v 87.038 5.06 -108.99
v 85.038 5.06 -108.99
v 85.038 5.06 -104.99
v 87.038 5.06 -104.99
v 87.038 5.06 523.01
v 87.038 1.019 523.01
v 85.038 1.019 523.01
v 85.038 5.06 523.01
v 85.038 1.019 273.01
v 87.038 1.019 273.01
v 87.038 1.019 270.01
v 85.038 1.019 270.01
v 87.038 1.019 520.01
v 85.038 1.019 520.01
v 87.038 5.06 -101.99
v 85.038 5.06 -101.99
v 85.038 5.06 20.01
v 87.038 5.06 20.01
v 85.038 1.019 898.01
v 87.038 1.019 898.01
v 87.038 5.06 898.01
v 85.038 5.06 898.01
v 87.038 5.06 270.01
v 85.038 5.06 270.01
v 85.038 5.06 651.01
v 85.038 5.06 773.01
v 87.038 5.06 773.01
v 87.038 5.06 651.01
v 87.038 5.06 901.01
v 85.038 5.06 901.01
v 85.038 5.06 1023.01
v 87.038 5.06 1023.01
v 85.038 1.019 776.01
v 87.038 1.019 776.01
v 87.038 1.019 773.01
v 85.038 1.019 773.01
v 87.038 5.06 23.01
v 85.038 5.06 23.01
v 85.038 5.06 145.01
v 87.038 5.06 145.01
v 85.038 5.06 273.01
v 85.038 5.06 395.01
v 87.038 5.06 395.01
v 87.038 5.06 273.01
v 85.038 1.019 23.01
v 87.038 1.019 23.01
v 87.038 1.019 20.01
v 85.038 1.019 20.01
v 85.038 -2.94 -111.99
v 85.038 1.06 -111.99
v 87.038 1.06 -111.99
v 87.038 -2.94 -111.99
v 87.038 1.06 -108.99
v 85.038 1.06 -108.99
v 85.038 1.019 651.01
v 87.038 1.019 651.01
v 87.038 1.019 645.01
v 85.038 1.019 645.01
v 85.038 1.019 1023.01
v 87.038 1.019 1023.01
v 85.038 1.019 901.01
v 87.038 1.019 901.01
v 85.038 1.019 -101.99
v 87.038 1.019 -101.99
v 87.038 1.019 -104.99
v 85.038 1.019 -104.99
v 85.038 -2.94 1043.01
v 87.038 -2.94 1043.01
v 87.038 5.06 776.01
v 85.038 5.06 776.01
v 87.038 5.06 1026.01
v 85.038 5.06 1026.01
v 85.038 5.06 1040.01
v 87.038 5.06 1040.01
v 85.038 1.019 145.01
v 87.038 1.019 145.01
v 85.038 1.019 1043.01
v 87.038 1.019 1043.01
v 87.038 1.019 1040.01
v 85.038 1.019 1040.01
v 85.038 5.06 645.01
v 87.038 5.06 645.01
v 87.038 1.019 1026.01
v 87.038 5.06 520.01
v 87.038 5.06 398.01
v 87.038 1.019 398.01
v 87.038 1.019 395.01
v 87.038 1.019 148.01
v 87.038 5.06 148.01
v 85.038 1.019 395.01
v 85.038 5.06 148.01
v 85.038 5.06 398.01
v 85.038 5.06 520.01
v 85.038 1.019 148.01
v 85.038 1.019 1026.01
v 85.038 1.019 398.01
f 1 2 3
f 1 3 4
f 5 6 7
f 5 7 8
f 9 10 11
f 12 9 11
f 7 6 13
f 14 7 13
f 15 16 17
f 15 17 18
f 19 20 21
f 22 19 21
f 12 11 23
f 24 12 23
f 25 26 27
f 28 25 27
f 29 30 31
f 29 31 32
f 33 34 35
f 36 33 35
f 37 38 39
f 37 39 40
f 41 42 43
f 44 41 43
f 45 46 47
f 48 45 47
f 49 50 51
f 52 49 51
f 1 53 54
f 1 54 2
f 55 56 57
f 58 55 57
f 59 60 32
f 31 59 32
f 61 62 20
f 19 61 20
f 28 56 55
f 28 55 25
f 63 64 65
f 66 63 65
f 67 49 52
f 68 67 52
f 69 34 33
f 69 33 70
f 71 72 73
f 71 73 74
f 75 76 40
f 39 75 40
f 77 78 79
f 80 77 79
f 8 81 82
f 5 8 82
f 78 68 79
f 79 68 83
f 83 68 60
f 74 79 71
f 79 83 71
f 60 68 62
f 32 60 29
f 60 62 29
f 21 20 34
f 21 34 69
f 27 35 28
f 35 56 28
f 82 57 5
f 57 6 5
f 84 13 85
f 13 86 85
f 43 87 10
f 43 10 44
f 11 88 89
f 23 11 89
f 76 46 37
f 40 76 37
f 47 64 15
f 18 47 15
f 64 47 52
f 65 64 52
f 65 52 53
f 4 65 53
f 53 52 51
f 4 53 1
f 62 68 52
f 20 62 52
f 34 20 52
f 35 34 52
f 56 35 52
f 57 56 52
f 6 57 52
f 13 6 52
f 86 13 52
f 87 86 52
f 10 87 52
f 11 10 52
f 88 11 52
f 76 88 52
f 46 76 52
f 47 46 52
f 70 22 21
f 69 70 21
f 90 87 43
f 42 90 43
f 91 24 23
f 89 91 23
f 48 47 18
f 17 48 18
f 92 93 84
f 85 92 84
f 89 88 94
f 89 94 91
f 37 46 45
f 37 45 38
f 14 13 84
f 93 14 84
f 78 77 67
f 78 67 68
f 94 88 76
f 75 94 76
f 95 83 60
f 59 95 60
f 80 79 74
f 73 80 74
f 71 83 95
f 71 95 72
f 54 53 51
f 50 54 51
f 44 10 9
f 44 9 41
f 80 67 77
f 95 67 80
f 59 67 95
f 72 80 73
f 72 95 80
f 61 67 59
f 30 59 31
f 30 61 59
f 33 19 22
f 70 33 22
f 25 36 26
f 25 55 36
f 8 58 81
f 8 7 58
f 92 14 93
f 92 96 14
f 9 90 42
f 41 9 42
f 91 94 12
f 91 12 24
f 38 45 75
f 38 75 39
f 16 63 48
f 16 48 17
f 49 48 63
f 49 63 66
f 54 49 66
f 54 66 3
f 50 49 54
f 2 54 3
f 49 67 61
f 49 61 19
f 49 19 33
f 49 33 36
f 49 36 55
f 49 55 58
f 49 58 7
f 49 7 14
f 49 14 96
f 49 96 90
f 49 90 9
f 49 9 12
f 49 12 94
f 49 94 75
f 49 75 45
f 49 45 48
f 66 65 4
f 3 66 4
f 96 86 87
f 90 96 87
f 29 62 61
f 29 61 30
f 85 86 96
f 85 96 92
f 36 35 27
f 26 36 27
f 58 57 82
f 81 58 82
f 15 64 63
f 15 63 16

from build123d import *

# Parameters (mm, degrees)
SKETCH_1_W          = 2
SKETCH_1_H          = 8
EXTRUDE_1_DEPTH     = 1155
SKETCH_2_W          = 3
SKETCH_2_H          = 4.040923936
SKETCH_2_H_2        = 4
CUT_EXTRUDE_1_DEPTH = 1044.024193051


with BuildPart() as part:
    # 草图1 → 凸台-拉伸1 (new body)
    with BuildSketch(Plane.XY.offset(-111.99)):
        with Locations((86.037619105, 1.060354741)):
            Rectangle(SKETCH_1_W, SKETCH_1_H)
    extrude(amount=EXTRUDE_1_DEPTH)

    # 草图2 → 切除-拉伸1 (cut, through all)
    with BuildSketch(Plane(origin=(87.037619105, 0, 0), x_dir=(0, 0, -1), z_dir=(1, 0, 0))):
        with Locations((-1041.51, 3.039892773)):
            Rectangle(SKETCH_2_W, SKETCH_2_H)
        with Locations((-1024.51, 3.039892773)):
            Rectangle(SKETCH_2_W, SKETCH_2_H)
        with Locations((-899.51, 3.039892773)):
            Rectangle(SKETCH_2_W, SKETCH_2_H)
        with Locations((-774.51, 3.039892773)):
            Rectangle(SKETCH_2_W, SKETCH_2_H)
        with Locations((-649.51, 3.039892773)):
            Rectangle(SKETCH_2_W, SKETCH_2_H)
        with Locations((-646.51, 3.039892773)):
            Rectangle(SKETCH_2_W, SKETCH_2_H)
        with Locations((-521.51, 3.039892773)):
            Rectangle(SKETCH_2_W, SKETCH_2_H)
        with Locations((-396.51, 3.039892773)):
            Rectangle(SKETCH_2_W, SKETCH_2_H)
        with Locations((-271.51, 3.039892773)):
            Rectangle(SKETCH_2_W, SKETCH_2_H)
        with Locations((-146.51, 3.039892773)):
            Rectangle(SKETCH_2_W, SKETCH_2_H)
        with Locations((-21.51, 3.039892773)):
            Rectangle(SKETCH_2_W, SKETCH_2_H)
        with Locations((103.49, 3.039892773)):
            Rectangle(SKETCH_2_W, SKETCH_2_H)
        with Locations((110.49, 3.060354741)):
            Rectangle(SKETCH_2_W, SKETCH_2_H_2)
    extrude(amount=-CUT_EXTRUDE_1_DEPTH, mode=Mode.SUBTRACT)


solid = part.part
